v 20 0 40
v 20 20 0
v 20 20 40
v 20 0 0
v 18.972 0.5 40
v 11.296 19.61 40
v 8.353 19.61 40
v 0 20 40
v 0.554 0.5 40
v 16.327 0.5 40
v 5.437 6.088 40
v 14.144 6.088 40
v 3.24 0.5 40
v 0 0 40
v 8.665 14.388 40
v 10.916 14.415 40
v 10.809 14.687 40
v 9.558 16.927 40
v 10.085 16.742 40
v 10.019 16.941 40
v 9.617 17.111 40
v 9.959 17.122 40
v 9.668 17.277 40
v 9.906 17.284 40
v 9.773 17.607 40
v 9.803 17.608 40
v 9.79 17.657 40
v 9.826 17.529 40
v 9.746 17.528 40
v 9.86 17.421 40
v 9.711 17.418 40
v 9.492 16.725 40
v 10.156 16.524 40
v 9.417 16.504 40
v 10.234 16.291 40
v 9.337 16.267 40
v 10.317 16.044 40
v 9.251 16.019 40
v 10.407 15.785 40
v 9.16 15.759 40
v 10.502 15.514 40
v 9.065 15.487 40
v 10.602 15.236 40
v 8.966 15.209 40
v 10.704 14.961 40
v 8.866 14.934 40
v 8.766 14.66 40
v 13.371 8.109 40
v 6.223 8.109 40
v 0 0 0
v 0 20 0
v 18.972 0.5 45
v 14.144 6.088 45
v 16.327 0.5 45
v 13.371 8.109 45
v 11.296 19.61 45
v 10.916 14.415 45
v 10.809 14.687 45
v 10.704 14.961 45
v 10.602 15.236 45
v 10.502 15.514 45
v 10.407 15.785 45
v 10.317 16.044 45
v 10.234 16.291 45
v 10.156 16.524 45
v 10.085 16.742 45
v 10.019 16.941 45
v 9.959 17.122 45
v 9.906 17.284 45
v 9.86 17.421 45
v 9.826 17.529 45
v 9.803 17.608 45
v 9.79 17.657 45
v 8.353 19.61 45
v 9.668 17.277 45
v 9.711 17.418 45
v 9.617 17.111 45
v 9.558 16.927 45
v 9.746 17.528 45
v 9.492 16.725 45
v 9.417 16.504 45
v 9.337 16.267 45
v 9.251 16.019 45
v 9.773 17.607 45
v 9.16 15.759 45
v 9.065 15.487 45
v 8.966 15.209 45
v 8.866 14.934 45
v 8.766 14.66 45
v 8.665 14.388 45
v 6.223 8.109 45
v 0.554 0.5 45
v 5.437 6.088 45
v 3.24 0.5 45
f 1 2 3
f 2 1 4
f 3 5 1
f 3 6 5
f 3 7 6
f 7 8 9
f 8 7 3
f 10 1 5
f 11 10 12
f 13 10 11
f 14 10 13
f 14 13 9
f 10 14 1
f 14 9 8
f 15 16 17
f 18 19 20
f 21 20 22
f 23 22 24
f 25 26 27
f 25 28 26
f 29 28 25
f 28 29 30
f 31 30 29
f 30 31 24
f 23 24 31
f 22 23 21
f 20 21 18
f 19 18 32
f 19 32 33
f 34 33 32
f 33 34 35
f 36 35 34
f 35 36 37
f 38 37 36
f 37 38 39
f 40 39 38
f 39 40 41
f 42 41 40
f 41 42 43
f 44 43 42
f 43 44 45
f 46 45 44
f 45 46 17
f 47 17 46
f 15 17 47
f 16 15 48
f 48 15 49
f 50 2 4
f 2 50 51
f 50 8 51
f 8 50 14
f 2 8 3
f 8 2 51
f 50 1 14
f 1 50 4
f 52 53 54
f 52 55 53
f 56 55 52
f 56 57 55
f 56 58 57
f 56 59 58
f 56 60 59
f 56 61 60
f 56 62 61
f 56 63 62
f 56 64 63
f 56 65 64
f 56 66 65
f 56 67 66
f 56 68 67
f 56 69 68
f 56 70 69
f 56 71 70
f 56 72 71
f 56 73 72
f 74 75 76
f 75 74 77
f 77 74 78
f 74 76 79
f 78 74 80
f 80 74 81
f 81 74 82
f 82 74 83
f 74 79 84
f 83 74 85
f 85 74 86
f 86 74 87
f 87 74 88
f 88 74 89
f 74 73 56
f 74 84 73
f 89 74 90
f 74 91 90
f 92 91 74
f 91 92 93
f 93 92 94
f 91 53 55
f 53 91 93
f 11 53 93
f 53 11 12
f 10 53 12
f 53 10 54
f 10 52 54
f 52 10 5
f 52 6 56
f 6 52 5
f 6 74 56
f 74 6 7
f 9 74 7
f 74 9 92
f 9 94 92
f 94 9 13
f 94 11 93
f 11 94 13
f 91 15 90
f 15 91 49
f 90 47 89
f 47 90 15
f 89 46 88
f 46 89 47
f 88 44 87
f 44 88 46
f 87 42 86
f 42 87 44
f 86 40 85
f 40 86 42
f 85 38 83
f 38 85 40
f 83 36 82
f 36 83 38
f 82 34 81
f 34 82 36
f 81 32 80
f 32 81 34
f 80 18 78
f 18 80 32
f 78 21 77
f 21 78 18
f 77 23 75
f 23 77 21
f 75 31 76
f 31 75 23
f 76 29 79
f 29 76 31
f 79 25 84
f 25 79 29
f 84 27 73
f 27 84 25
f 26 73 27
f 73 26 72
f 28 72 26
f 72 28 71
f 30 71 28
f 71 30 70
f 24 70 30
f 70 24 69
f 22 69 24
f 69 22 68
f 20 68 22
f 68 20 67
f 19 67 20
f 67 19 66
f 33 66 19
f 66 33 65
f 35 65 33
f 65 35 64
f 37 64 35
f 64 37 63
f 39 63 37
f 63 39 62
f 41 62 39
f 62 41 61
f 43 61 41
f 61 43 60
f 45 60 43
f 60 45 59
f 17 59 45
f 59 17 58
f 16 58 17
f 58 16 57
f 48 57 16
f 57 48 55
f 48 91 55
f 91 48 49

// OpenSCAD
cube([20, 20, 40]);
translate([0.5, 0.5, 40]){
    linear_extrude(5){
        text("A", size=20);
    }
}
